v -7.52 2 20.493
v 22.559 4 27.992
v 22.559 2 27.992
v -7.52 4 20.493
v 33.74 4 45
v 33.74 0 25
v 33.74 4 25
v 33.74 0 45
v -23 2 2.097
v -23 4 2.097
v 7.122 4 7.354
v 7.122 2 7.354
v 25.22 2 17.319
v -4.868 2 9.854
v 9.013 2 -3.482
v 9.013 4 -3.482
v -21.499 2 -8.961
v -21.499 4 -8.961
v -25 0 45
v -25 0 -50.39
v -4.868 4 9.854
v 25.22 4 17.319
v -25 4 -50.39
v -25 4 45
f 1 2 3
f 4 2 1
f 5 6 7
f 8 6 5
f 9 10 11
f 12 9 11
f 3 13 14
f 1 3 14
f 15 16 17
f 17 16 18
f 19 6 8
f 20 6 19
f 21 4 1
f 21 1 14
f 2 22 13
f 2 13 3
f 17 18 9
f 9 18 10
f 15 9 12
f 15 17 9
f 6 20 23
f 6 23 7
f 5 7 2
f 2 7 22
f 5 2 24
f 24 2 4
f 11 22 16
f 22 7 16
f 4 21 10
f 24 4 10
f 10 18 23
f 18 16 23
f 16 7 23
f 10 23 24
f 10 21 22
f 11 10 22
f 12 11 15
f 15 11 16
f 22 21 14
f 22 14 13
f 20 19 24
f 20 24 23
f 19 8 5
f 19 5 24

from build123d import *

# Parameters (mm, degrees)
BOSS_EXTRUDE1_DEPTH = 4
CUT_EXTRUDE1_DEPTH  = 2
CUT_EXTRUDE2_DEPTH  = 2


with BuildPart() as part:
    # Sketch1 → Boss-Extrude1 (new body)
    with BuildSketch(Plane(origin=(0, 0, 0), x_dir=(1, 0, 0), z_dir=(0, 1, 0))):
        Polygon((-25, 50.39), (33.74, -25), (33.74, -45), (-25, -45), align=None)
    extrude(amount=BOSS_EXTRUDE1_DEPTH)

    # Sketch2 → Cut-Extrude1 (cut)
    with BuildSketch(Plane(origin=(0, 4, 0), x_dir=(1, 0, 0), z_dir=(0, 1, 0))):
        Polygon((-23, -2.0971477), (7.121683168, -7.35422298), (9.012903271, 3.481979608), (-21.498978305, 8.961494434), align=None)
    extrude(amount=-CUT_EXTRUDE1_DEPTH, mode=Mode.SUBTRACT)

    # Sketch4 → Cut-Extrude2 (cut)
    with BuildSketch(Plane(origin=(0, 4, 0), x_dir=(1, 0, 0), z_dir=(0, 1, 0))):
        Polygon((-4.867869217, -9.85422298), (25.219953937, -17.319000128), (22.558813085, -27.992253117), (-7.520354429, -20.492674354), align=None)
    extrude(amount=-CUT_EXTRUDE2_DEPTH, mode=Mode.SUBTRACT)


solid = part.part
